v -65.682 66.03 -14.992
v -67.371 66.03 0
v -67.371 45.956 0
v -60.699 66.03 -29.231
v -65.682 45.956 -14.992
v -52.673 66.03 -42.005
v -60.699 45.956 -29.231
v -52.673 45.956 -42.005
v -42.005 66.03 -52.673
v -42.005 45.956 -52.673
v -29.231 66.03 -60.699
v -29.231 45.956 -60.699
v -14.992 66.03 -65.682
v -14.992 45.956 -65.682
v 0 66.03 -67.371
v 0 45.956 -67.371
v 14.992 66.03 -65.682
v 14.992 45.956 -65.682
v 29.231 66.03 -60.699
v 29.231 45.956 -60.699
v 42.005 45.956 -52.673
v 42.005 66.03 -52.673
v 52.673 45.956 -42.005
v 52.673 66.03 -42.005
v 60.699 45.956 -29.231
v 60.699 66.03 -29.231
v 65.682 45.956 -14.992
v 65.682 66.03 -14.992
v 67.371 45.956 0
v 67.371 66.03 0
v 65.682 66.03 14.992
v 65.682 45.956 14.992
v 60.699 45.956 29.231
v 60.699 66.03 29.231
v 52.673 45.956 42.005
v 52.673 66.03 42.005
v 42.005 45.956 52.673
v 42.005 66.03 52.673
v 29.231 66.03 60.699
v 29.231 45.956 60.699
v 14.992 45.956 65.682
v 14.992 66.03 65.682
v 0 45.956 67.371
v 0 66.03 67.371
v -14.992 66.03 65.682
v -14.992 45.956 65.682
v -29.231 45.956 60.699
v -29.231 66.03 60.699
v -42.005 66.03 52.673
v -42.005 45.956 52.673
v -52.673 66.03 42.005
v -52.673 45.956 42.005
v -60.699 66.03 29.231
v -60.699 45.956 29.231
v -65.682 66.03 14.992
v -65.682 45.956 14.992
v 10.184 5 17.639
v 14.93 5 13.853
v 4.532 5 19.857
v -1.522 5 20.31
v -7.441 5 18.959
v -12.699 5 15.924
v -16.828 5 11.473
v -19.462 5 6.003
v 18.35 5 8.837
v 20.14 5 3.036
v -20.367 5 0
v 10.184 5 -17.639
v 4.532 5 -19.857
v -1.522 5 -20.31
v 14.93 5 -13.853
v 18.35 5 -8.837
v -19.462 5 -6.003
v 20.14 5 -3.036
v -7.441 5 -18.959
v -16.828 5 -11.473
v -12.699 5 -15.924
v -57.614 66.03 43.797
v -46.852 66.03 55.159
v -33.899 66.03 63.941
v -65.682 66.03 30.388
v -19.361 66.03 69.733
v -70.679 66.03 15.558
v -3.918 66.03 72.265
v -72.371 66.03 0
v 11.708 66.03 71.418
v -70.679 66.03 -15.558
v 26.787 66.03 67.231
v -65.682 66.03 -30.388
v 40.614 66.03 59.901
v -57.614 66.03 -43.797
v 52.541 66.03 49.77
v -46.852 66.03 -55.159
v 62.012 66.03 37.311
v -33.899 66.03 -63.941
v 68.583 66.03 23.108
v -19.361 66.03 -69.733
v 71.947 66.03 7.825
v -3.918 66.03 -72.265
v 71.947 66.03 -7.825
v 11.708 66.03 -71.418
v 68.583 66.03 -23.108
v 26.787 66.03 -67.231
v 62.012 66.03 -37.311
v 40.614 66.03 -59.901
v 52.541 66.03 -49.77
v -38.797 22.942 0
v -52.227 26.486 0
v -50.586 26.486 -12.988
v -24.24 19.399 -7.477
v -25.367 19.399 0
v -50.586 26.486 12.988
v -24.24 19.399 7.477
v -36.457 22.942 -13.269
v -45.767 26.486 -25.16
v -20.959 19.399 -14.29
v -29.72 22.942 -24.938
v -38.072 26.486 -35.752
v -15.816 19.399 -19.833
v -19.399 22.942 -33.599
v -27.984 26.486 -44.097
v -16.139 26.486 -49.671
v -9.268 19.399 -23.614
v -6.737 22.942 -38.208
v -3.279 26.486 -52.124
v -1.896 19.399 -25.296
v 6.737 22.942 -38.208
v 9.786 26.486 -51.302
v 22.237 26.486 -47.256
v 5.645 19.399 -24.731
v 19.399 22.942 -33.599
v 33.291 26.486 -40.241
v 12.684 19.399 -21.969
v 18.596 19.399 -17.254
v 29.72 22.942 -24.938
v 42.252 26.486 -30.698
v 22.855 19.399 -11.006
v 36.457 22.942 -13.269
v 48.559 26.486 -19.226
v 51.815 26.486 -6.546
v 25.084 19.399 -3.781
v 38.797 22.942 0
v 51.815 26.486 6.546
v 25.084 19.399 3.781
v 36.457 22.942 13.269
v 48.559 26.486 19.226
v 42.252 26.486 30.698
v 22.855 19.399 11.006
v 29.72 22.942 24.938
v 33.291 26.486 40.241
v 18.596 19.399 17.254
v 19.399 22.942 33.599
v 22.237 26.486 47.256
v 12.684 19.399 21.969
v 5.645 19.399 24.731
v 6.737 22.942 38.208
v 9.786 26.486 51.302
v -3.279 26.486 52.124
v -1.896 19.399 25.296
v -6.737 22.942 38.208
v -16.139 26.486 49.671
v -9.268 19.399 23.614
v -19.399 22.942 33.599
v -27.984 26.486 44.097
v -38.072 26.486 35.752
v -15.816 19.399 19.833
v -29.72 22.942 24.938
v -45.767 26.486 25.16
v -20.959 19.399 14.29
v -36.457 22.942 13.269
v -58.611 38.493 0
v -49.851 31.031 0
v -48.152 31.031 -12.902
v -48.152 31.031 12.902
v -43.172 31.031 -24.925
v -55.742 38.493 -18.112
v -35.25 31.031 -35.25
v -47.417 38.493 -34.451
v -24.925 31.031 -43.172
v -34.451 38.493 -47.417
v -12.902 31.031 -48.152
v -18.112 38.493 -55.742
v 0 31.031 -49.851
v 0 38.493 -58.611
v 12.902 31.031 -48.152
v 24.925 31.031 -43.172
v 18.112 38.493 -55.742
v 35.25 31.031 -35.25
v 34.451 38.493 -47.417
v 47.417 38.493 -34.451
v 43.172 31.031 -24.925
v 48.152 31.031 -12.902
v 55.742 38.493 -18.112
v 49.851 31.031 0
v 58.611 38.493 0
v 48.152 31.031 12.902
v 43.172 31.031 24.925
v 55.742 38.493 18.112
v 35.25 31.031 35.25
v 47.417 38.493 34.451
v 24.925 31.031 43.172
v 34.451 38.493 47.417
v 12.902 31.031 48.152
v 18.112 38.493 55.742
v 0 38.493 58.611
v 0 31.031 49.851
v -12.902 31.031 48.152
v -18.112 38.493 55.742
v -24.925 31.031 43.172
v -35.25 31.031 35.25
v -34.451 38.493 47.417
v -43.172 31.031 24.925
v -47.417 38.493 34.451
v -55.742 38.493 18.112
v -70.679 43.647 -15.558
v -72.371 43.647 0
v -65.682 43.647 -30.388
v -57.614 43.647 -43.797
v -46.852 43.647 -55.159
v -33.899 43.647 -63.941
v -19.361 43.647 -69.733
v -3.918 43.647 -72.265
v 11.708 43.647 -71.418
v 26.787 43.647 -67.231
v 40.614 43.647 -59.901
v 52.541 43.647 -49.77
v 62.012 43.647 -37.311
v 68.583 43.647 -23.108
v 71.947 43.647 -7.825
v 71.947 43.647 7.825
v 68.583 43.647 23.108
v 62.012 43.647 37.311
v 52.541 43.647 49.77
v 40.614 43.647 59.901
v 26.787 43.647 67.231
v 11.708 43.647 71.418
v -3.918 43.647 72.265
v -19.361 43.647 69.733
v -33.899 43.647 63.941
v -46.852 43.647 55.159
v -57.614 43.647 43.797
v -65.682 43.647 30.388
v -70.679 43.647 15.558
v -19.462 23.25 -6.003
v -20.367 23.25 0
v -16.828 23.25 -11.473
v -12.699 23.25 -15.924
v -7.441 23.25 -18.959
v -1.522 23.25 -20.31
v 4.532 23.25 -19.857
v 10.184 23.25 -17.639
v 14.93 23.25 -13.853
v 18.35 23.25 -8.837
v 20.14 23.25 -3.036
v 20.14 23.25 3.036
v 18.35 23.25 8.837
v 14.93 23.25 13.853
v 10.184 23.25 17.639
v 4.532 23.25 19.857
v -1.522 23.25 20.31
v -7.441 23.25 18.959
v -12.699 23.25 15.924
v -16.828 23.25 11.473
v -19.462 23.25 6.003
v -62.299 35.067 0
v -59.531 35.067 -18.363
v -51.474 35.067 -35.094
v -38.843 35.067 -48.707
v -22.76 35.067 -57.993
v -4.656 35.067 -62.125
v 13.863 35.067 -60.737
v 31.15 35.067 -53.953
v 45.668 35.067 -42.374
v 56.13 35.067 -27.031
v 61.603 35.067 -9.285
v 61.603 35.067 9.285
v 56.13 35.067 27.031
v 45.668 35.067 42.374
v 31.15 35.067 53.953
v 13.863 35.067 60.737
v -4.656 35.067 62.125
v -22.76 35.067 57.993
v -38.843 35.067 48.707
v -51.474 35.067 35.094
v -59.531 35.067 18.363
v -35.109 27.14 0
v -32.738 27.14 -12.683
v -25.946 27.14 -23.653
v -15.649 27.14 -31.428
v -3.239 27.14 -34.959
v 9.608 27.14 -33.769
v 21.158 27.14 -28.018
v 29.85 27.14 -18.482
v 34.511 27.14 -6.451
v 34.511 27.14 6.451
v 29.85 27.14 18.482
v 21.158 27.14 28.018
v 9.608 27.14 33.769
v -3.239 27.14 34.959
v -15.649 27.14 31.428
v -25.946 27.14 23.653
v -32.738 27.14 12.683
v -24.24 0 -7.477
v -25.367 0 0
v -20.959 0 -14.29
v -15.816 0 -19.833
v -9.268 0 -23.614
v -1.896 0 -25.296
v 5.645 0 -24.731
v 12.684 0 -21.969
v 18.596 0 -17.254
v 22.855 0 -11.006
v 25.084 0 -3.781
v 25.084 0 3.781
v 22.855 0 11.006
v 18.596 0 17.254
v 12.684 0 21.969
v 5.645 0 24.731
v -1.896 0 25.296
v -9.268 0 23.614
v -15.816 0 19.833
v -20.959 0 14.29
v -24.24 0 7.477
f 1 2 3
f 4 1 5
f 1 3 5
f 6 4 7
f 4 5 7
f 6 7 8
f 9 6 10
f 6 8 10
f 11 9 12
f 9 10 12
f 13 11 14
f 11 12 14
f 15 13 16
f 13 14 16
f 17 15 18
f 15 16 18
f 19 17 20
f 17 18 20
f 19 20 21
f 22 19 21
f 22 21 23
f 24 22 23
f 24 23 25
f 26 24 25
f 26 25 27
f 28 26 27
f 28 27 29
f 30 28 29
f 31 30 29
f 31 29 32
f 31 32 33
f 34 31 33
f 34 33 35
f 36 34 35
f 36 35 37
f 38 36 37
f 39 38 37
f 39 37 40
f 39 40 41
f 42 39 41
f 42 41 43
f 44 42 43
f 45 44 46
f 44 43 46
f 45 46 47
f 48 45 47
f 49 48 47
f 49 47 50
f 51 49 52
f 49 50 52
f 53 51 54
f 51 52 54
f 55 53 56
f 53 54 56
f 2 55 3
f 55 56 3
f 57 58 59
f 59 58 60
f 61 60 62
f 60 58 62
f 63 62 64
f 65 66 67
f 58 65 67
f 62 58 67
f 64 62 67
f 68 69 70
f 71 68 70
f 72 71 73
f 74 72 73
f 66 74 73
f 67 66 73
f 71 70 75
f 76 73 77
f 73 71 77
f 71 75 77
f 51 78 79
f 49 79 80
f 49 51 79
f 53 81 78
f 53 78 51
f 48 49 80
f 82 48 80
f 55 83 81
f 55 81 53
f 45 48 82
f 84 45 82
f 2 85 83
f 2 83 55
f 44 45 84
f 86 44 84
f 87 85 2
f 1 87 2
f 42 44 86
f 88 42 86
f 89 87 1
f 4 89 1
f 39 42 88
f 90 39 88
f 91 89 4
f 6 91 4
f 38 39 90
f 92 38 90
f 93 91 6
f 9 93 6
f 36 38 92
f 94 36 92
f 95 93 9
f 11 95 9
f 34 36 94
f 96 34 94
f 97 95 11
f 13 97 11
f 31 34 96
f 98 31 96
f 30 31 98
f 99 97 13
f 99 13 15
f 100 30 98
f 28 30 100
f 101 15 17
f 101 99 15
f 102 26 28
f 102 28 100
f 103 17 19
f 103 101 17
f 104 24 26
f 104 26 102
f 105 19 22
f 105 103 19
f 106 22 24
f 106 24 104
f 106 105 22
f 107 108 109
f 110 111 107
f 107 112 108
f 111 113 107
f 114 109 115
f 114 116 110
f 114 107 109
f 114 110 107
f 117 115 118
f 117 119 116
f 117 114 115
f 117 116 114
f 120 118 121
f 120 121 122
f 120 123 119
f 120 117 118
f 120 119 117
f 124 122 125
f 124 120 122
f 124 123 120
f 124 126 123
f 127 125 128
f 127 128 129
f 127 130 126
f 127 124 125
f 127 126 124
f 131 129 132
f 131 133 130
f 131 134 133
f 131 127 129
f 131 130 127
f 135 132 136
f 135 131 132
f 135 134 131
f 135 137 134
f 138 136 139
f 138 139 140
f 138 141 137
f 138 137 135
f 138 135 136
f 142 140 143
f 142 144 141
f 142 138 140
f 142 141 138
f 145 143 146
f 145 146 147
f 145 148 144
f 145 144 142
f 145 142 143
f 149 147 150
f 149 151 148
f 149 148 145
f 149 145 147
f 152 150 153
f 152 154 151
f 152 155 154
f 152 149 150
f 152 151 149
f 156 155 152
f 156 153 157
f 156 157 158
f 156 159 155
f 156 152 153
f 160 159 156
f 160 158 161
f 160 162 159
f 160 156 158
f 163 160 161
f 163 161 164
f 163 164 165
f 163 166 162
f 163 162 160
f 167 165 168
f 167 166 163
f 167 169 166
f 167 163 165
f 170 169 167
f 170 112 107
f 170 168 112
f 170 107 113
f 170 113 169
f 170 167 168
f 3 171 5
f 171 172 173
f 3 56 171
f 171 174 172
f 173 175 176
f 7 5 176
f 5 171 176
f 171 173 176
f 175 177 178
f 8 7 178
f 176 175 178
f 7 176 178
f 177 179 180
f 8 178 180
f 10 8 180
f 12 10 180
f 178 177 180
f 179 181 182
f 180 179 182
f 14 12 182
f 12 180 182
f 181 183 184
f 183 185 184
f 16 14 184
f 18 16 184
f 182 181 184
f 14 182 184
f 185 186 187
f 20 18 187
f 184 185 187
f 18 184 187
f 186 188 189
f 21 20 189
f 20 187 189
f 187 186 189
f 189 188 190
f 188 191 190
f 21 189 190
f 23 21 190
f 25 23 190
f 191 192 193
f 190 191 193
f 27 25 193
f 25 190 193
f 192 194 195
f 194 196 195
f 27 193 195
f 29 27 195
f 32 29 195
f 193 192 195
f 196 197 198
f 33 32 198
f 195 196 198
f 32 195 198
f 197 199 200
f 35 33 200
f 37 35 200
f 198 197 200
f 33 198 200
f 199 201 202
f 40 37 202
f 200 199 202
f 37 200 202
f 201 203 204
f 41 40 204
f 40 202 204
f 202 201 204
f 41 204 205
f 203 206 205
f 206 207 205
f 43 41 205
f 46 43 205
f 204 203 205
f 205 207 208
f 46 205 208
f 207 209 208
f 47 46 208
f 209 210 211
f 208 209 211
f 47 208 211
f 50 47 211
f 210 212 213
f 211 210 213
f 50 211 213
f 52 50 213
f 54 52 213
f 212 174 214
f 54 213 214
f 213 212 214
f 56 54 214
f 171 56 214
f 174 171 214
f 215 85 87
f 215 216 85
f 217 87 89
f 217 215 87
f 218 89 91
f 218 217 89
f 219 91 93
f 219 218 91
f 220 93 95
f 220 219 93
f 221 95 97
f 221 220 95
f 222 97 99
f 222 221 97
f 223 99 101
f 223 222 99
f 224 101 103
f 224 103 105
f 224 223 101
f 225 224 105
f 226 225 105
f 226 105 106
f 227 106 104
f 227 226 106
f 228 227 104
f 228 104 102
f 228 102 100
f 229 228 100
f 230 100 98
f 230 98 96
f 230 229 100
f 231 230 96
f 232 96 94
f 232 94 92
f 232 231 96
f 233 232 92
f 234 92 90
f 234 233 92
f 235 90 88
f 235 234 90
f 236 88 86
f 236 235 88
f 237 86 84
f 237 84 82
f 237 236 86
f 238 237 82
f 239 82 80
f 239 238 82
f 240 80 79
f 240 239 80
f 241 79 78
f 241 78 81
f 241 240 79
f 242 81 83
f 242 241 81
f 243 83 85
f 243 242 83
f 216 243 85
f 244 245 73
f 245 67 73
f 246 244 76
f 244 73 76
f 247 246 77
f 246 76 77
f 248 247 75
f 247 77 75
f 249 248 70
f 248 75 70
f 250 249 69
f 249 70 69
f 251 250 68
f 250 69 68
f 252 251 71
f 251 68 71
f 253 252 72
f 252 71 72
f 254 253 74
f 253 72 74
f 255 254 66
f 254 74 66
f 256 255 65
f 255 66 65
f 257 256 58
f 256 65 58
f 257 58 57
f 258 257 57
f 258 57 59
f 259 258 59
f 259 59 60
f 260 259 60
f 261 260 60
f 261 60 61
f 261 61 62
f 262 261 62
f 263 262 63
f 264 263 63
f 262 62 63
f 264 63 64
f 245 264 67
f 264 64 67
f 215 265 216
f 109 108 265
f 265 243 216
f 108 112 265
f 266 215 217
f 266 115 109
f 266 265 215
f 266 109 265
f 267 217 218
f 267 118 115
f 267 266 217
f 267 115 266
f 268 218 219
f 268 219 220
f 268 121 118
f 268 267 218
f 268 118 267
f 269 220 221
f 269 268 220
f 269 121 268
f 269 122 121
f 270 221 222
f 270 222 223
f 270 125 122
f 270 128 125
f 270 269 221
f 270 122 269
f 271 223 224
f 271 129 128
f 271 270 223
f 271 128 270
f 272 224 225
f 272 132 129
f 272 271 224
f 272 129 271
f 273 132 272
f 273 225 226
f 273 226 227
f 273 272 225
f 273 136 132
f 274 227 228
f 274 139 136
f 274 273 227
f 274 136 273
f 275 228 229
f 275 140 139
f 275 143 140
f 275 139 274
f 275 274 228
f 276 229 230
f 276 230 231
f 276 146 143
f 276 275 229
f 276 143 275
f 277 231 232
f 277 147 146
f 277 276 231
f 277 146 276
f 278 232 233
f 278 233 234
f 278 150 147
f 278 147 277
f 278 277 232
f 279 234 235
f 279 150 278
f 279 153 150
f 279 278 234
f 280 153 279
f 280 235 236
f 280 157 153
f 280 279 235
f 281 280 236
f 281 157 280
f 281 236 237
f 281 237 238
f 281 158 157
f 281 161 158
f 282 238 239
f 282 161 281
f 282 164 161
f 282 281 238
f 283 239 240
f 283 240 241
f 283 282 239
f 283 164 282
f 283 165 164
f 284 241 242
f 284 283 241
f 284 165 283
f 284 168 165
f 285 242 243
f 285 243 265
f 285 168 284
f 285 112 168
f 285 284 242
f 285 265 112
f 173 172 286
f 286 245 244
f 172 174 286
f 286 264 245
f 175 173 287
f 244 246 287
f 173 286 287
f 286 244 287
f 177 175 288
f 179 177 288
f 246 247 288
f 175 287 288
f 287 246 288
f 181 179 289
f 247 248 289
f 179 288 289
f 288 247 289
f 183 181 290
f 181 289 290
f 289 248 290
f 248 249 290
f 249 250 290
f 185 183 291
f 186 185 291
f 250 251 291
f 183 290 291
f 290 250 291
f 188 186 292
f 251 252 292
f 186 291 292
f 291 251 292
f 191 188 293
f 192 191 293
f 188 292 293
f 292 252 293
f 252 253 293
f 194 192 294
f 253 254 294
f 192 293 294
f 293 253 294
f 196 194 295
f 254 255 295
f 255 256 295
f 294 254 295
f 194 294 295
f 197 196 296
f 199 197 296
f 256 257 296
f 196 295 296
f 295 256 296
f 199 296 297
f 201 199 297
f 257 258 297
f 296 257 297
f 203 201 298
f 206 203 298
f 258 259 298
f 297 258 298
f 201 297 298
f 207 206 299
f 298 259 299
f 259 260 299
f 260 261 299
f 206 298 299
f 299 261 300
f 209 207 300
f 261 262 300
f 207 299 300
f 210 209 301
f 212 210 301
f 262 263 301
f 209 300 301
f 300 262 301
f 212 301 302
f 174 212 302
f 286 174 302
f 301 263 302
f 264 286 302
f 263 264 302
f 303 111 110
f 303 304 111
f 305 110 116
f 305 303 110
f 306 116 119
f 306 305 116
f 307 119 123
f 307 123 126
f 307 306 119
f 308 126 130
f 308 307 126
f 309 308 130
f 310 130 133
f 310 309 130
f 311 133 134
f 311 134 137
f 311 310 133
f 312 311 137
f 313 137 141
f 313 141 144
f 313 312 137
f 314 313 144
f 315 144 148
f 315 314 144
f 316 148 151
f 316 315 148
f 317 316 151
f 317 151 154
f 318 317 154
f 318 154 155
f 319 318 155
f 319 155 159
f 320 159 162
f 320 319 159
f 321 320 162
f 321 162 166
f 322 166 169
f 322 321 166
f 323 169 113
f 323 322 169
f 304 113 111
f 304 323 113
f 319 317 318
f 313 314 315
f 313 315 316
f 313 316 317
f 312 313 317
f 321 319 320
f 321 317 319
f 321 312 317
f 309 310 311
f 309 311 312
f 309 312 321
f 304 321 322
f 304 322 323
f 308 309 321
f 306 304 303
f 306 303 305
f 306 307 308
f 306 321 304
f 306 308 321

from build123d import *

# Parameters (mm, degrees)
F2_T = -5


with BuildPart() as f1:
    # F0 (on Top) → F1 (revolve)
    with BuildSketch(Plane.XY):
        Polygon((-25.3672786057, 19.3985067308), (-25.3672786057, 0), (0, 0), (0, 66.0295262933), (-72.3713487387, 66.0295262933), (-72.3713487387, 43.6466373503), (-52.2267483175, 26.4864228666), align=None)
    revolve(axis=Axis((0, 33.0147631466, 0), (0, -1, 0)))

    # F2
    f2_openings = [f1.faces().sort_by_distance(p)[0] for p in [
        (0, 66.029526, 0),
    ]]
    offset(amount=F2_T, openings=f2_openings, kind=Kind.INTERSECTION)


solid = f1.part
